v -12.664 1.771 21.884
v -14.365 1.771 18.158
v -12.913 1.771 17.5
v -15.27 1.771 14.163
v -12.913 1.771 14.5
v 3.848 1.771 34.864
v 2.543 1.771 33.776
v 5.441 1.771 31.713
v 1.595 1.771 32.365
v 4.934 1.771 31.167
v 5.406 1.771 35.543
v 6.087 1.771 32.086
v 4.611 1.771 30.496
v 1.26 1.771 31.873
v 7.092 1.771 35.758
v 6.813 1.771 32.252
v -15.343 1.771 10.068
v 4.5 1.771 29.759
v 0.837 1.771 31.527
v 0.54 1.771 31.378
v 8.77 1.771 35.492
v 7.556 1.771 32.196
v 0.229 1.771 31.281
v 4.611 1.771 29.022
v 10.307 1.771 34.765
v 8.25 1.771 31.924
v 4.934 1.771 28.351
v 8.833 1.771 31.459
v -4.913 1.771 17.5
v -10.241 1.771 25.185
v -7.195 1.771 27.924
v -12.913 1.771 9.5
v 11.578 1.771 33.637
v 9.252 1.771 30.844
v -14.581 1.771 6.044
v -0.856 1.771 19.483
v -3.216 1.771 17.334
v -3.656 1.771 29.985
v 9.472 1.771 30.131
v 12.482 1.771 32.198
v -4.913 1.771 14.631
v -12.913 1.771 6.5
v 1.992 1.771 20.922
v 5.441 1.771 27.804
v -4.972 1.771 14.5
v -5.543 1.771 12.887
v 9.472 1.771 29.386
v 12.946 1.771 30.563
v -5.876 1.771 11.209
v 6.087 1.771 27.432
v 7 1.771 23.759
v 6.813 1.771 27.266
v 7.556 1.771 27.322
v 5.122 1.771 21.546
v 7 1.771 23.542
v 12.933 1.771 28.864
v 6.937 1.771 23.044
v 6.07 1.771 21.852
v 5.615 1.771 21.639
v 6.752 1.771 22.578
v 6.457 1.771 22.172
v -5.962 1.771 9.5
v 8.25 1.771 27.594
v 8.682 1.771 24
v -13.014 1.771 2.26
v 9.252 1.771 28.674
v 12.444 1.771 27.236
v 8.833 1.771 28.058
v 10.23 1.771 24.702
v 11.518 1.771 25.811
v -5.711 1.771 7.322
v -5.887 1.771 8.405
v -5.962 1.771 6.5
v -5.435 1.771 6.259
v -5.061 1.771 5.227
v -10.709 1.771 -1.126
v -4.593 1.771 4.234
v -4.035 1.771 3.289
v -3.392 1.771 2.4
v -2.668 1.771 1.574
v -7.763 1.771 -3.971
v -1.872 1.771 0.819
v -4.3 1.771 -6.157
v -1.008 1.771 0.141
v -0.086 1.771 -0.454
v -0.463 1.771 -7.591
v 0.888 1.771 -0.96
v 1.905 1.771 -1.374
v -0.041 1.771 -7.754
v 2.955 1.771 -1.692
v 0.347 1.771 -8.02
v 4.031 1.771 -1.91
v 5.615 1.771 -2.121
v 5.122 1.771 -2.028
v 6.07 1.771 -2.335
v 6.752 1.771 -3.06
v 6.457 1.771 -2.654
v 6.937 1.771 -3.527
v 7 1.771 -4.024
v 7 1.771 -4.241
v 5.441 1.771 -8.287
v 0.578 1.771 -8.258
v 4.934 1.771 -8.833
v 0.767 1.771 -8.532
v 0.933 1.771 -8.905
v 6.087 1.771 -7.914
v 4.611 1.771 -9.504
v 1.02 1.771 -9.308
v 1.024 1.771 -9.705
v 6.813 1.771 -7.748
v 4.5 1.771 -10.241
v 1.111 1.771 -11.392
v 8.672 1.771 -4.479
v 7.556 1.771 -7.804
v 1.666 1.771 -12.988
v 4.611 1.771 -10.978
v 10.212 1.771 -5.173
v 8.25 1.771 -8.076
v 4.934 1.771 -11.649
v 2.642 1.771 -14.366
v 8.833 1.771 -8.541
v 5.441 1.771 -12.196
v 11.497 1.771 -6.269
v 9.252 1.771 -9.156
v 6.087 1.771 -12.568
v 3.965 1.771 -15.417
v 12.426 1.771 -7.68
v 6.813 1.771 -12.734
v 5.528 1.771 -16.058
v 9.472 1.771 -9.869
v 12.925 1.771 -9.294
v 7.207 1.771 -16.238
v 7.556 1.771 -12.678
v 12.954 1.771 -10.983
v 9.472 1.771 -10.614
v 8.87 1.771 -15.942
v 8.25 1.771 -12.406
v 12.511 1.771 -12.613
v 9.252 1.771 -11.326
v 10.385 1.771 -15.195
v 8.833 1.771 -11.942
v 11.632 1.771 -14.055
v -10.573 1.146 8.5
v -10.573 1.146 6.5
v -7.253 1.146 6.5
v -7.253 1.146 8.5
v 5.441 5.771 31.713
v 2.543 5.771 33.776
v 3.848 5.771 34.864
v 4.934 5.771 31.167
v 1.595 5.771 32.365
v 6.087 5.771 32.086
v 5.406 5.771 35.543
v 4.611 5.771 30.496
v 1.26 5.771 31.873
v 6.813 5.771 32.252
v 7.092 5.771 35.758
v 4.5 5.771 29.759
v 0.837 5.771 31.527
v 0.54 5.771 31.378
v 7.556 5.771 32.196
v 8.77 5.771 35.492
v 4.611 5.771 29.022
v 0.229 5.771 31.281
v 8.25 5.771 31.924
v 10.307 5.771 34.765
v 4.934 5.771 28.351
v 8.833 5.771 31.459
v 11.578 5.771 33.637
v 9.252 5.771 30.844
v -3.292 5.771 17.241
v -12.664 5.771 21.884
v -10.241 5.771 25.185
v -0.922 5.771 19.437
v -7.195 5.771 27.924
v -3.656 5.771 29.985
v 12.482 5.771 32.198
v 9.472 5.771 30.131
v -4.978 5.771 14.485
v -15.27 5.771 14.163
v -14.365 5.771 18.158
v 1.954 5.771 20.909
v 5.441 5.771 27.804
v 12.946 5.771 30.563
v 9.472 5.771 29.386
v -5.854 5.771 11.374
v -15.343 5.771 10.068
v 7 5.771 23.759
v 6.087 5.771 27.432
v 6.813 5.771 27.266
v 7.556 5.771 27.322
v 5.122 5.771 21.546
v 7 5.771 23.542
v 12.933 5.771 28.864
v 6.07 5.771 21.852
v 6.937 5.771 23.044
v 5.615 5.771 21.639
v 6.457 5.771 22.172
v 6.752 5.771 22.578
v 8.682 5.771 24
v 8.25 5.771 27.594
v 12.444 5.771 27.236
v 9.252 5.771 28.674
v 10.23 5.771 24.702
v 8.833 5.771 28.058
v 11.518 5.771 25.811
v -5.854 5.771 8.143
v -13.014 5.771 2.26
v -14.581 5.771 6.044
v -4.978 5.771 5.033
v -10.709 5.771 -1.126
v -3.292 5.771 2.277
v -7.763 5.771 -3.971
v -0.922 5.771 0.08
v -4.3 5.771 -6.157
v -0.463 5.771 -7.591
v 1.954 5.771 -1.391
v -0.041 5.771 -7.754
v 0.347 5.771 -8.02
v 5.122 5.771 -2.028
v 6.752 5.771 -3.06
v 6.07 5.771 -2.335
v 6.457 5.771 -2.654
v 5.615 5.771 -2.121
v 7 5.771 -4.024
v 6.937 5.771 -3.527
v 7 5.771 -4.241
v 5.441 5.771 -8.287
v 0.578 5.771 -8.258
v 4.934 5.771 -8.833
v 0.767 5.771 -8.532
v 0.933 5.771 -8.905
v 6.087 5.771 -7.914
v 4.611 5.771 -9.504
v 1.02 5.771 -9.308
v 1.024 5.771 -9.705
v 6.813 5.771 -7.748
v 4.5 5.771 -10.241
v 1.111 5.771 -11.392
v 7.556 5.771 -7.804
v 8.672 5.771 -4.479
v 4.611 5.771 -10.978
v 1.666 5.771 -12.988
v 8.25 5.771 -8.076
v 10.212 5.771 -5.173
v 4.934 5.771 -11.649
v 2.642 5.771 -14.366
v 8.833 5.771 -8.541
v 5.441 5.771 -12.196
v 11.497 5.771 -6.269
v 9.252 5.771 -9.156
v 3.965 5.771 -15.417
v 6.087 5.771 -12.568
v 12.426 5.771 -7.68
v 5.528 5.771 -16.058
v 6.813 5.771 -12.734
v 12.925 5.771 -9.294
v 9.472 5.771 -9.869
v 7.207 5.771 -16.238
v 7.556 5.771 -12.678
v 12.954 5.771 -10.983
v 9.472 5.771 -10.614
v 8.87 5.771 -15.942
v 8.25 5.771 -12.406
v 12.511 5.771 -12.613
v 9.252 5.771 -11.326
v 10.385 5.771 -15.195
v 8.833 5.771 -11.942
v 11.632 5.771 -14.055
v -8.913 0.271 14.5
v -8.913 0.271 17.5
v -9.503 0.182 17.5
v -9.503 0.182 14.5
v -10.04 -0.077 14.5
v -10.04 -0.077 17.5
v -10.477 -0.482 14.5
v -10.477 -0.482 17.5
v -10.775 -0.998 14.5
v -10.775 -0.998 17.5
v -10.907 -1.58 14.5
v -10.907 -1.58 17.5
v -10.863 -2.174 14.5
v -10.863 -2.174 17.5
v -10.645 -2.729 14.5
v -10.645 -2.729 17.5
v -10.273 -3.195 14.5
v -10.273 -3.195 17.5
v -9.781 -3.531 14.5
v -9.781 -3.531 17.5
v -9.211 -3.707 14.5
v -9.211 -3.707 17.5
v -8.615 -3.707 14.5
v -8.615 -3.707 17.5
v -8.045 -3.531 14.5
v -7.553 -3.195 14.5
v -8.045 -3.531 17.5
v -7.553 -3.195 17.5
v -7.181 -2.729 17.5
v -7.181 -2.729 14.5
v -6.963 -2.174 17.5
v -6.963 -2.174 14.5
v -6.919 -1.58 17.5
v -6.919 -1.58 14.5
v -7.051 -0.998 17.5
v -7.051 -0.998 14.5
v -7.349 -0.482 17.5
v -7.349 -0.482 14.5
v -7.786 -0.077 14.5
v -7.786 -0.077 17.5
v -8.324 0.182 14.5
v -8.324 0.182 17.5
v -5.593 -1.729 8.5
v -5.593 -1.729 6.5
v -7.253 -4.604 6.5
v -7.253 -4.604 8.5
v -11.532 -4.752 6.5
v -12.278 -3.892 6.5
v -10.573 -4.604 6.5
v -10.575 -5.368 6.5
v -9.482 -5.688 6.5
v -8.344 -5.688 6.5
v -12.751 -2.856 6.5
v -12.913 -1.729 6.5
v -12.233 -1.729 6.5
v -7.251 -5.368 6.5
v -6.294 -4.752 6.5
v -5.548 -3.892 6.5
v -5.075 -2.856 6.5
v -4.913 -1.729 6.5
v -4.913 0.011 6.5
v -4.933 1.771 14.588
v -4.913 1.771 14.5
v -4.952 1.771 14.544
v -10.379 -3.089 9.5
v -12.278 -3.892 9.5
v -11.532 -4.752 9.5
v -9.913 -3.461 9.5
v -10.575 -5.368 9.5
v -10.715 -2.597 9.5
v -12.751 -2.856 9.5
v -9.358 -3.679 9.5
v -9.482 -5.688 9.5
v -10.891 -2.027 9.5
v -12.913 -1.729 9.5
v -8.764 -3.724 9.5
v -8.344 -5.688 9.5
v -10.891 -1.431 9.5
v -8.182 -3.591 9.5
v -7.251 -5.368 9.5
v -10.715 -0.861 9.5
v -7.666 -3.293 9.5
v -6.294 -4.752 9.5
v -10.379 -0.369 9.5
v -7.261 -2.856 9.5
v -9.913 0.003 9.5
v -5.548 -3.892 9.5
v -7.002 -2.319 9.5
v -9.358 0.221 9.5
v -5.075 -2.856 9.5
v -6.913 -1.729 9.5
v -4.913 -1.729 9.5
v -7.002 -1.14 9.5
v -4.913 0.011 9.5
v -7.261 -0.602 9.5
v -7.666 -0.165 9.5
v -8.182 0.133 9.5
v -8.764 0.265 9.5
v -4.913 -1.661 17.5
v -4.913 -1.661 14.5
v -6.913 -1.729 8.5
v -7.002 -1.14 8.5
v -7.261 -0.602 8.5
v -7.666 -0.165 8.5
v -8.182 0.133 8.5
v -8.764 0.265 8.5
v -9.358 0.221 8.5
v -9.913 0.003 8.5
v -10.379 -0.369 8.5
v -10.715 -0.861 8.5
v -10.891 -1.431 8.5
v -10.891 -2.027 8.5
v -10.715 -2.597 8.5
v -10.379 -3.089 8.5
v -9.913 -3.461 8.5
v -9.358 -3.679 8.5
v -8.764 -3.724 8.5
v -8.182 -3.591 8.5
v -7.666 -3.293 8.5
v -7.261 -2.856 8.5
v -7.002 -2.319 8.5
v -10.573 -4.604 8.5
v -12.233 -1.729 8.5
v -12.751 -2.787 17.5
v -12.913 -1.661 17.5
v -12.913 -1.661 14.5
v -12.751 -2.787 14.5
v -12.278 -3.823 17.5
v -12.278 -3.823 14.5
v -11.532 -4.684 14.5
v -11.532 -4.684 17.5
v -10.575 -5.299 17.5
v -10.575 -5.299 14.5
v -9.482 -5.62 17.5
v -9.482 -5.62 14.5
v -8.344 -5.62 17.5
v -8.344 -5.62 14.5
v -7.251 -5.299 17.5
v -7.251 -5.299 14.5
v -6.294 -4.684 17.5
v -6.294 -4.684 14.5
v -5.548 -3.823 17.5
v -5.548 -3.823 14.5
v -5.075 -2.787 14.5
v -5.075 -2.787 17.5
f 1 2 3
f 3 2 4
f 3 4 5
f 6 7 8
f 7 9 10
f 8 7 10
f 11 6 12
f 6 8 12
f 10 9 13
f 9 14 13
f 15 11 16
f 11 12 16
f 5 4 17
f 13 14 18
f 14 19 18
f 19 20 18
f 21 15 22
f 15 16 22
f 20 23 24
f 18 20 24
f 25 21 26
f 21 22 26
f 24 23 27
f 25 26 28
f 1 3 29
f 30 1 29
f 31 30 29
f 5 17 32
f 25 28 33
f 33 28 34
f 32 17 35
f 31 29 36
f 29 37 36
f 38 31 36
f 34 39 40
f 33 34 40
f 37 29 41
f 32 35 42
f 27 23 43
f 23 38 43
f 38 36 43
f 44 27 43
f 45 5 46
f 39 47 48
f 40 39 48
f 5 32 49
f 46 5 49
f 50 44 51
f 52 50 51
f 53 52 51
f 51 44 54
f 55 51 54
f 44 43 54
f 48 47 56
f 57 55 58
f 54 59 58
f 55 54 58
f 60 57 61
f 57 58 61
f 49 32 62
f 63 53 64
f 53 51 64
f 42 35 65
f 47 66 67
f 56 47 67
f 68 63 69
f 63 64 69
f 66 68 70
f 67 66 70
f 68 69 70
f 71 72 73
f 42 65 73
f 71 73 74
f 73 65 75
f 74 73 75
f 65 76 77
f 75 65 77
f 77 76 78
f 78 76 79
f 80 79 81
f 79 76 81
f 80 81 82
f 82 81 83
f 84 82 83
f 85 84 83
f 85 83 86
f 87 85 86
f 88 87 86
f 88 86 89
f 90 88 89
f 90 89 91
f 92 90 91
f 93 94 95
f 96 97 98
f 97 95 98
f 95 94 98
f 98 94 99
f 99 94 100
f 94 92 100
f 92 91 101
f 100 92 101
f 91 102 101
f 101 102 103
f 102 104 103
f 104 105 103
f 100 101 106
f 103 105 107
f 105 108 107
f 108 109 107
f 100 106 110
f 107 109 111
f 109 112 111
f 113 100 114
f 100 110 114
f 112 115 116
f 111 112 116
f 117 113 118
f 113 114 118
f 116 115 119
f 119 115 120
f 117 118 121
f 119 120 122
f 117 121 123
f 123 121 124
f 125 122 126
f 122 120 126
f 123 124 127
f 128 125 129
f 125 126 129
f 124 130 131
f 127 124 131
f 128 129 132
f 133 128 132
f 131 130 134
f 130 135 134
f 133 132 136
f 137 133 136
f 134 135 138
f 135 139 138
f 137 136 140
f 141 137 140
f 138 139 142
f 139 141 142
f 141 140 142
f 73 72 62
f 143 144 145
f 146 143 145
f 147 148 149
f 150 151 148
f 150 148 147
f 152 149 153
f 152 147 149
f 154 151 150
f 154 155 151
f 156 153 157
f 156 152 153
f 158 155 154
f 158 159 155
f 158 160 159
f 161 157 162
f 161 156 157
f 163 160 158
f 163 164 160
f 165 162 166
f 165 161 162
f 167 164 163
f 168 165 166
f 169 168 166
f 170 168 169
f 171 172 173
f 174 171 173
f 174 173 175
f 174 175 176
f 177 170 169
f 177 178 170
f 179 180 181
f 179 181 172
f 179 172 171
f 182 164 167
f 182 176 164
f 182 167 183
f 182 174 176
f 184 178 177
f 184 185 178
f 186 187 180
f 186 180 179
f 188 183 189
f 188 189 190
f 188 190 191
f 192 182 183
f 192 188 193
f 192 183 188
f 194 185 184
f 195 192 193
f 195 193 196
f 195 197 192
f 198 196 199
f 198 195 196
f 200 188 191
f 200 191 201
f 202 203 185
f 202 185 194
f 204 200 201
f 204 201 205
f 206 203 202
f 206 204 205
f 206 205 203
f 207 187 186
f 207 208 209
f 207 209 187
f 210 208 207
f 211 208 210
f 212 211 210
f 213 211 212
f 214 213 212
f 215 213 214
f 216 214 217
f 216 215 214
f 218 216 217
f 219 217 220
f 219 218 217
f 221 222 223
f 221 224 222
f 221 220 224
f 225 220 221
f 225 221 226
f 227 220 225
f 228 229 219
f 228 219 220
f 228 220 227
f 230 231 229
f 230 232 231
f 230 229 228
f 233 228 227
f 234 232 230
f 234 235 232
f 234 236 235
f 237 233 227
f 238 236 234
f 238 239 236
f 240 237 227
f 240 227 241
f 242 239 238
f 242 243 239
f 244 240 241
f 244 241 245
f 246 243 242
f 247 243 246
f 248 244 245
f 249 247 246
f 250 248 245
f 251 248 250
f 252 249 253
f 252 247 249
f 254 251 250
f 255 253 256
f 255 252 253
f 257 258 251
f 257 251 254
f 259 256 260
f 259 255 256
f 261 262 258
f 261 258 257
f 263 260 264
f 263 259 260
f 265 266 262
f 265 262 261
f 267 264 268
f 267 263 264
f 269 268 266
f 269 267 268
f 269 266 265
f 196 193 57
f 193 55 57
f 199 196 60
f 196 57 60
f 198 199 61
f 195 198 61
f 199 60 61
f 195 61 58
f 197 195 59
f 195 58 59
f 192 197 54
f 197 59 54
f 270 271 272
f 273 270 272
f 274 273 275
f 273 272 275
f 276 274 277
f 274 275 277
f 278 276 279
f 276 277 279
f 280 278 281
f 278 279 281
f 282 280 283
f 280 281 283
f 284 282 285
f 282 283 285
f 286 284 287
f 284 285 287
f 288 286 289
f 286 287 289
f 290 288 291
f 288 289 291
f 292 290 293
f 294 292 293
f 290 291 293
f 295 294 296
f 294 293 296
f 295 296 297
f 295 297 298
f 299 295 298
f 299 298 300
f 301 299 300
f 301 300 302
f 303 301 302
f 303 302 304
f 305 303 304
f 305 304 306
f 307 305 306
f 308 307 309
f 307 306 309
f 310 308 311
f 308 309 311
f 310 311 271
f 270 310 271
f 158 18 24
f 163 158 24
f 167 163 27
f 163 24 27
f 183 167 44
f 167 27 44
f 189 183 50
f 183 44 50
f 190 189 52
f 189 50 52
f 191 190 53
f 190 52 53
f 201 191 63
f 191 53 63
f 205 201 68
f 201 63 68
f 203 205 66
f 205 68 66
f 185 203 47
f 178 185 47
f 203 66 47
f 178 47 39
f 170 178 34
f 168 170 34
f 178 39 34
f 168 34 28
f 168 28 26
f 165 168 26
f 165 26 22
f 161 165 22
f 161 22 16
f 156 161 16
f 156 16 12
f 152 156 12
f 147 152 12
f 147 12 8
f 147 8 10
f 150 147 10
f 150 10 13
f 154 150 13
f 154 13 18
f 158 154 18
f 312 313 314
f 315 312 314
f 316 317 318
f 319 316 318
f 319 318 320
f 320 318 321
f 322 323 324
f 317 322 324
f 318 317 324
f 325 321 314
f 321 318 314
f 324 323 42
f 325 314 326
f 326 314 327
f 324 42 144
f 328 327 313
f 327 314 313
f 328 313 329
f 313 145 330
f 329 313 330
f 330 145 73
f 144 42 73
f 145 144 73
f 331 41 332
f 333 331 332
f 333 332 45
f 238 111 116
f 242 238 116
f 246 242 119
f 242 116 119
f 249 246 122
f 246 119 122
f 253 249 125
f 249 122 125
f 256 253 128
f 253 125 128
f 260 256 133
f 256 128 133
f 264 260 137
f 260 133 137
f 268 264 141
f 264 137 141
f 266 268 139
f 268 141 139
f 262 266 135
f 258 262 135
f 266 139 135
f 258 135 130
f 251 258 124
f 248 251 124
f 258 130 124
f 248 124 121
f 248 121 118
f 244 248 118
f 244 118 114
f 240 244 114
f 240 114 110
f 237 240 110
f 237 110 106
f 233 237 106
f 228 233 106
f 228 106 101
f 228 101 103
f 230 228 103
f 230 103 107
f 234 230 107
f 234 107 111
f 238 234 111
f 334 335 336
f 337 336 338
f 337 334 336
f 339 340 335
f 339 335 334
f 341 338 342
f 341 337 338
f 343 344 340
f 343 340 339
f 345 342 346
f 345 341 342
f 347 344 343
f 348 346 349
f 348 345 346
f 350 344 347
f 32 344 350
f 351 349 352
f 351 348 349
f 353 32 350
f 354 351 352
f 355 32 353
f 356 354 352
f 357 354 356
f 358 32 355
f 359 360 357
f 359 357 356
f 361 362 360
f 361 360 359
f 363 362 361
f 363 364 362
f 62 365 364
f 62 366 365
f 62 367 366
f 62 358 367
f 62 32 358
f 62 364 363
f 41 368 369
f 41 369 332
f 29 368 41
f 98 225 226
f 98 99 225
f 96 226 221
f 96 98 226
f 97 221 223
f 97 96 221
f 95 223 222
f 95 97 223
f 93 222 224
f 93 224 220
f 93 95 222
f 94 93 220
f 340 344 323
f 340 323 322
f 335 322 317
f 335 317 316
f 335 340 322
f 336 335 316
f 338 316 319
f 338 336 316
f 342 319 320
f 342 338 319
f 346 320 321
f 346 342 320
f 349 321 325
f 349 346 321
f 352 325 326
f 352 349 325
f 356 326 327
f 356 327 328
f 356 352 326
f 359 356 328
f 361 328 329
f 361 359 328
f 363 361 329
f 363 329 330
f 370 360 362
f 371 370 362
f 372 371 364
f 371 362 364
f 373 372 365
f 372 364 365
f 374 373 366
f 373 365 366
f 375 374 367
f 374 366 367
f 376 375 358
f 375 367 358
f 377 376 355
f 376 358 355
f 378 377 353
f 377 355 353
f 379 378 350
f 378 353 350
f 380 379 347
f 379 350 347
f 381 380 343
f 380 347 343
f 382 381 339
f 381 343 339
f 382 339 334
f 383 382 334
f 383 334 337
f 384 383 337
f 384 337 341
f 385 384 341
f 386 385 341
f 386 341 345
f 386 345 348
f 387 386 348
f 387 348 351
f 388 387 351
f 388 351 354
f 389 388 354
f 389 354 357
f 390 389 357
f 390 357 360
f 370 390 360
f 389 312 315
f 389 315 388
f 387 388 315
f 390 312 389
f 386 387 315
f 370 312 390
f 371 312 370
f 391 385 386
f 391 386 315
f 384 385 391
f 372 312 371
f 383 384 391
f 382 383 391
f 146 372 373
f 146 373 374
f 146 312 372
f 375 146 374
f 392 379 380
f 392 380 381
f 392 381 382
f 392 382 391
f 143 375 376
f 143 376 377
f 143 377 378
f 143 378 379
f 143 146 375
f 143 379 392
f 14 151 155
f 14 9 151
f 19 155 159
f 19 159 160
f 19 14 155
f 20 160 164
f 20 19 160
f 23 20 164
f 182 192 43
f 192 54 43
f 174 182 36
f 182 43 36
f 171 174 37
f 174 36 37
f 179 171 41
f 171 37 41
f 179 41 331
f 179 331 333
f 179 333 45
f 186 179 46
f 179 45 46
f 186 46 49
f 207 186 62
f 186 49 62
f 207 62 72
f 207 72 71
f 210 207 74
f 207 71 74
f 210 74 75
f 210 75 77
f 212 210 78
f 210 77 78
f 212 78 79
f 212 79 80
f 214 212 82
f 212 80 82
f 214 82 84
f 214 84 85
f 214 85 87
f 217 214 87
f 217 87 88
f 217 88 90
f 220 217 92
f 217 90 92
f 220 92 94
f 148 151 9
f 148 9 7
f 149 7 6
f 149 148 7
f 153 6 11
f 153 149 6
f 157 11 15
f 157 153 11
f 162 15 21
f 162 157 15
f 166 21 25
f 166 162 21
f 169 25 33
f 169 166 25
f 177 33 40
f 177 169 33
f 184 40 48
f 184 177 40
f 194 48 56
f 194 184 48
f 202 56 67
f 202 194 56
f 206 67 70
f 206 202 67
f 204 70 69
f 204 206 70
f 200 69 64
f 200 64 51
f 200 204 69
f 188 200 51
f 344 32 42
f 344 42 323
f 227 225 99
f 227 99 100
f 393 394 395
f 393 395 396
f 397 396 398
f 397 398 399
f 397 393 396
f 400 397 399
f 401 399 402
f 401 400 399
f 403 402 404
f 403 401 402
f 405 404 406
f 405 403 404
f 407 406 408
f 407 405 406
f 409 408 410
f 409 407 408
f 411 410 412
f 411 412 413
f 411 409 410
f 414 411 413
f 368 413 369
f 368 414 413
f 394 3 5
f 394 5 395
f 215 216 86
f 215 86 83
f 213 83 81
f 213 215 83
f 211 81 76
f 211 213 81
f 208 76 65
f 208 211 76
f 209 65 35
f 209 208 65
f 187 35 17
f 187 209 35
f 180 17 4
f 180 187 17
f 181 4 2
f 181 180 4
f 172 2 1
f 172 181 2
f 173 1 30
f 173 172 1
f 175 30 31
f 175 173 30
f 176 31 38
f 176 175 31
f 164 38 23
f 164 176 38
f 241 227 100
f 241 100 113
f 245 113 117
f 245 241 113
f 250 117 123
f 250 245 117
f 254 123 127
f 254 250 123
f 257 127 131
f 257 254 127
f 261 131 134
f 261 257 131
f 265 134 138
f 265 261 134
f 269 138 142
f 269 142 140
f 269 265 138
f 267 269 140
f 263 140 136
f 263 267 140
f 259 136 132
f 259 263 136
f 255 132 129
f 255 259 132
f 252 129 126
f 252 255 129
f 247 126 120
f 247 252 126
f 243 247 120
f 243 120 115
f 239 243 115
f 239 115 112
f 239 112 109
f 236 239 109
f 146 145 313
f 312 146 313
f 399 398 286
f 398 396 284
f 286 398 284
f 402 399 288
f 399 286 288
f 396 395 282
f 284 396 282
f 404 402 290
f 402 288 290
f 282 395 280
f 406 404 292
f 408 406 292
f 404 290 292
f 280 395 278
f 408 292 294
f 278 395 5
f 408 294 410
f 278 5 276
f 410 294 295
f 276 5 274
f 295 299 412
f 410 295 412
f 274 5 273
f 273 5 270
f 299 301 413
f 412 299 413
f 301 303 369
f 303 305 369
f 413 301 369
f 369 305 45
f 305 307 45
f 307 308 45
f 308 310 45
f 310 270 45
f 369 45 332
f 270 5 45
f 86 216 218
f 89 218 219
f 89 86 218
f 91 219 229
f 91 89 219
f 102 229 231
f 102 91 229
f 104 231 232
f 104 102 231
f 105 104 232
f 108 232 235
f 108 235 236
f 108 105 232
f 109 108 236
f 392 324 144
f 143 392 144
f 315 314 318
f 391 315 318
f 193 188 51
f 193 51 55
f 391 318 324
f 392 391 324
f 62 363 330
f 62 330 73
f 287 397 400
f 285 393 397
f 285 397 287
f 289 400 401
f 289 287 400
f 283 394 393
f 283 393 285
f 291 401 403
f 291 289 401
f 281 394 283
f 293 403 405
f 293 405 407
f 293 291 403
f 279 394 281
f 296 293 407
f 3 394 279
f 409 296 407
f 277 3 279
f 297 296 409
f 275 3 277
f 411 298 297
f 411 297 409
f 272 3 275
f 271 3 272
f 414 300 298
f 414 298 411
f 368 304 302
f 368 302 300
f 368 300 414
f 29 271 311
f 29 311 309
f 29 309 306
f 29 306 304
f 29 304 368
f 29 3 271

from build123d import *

# Parameters (mm, degrees)
BOSS_EXTRUDE1_DEPTH          = 4
BOSS_EXTRUDE2_DEPTH          = 3
BOSS_EXTRUDE3_DEPTH          = 3
CUT_EXTRUDE1_DEPTH           = 2
F_5_0_5_DIAMETER_HOLE1_D     = 5
F_5_0_5_DIAMETER_HOLE1_DEPTH = 11.5
SKETCH7_W                    = 2
SKETCH7_H                    = 21.25889
M20_CLEARANCE_HOLE1_D        = 23.618330199
M20_CLEARANCE_HOLE1_DEPTH    = 4
F_4_0_4_DIAMETER_HOLE2_D     = 4
F_4_0_4_DIAMETER_HOLE2_DEPTH = 27.25889
FILLET1_R                    = 2


with BuildPart() as part:
    # Sketch1 → Boss-Extrude1 (new body)
    with BuildSketch(Plane(origin=(0, 5.770898059, 0), x_dir=(1, 0, 0), z_dir=(0, 1, 0))):
        with BuildLine():
            Line((7, -23.75889), (7, 4.24111))
            ThreePointArc((7, 4.24111), (10.353454391, 15.21648372), (1.438437052, 7.989662117))
            ThreePointArc((1.438437052, 7.989662117), (-15.414893863, -11.667157982), (1.252670952, -31.481739039))
            ThreePointArc((1.252670952, -31.481739039), (11.8133717, -33.340991741), (7, -23.75889))
        make_face()
    extrude(amount=-BOSS_EXTRUDE1_DEPTH)

    # Sketch2 → Boss-Extrude2 (add)
    with BuildSketch(Plane.XY.offset(17.5)):
        with BuildLine():
            Line((-4.913051605, -1.660534859), (-4.913051605, 1.770898059))
            Line((-4.913051605, 1.770898059), (-12.913051605, 1.770898059))
            Line((-12.913051605, 1.770898059), (-12.913051605, -1.660534859))
            ThreePointArc((-12.913051605, -1.660534859), (-8.913051605, -5.660534859), (-4.913051605, -1.660534859))
        make_face()
    extrude(amount=-BOSS_EXTRUDE2_DEPTH)

    # Sketch3 → Boss-Extrude3 (add)
    with BuildSketch(Plane.XY.offset(9.5)):
        with BuildLine():
            Line((-4.913051605, -1.729101941), (-4.913051605, 0.01125604))
            Line((-4.913051605, 0.01125604), (-5.962229818, 1.770898059))
            Line((-5.962229818, 1.770898059), (-12.913051605, 1.770898059))
            Line((-12.913051605, 1.770898059), (-12.913051605, -1.729101941))
            ThreePointArc((-12.913051605, -1.729101941), (-8.913051605, -5.729101941), (-4.913051605, -1.729101941))
        make_face()
    extrude(amount=-BOSS_EXTRUDE3_DEPTH)

    # Sketch4 → Cut-Extrude1 (cut)
    with BuildSketch(Plane(origin=(0, 0, 6.5), x_dir=(-1, 0, 0), z_dir=(0, 0, -1))):
        Polygon((7.253169581, 1.145898059), (5.593287557, -1.729101941), (7.253169581, -4.604101941), (10.572933629, -4.604101941), (12.232815653, -1.729101941), (10.572933629, 1.145898059), align=None)
    extrude(amount=-CUT_EXTRUDE1_DEPTH, mode=Mode.SUBTRACT)

    # Ø5.0 (5) Diameter Hole1
    with Locations(Plane(origin=(0, 5.770898059, 0), x_dir=(1, 0, 0), z_dir=(0, 1, 0))):
        with Locations((7, -29.75889), (7, 10.24111)):
            Hole(F_5_0_5_DIAMETER_HOLE1_D / 2, depth=F_5_0_5_DIAMETER_HOLE1_DEPTH)

    # Sketch7 → Ø4.0 (4) Diameter Hole1 (revolve, cut)
    with BuildSketch(Plane(origin=(-8.913051605, -1.729101941, 14.5), x_dir=(0, 1, 0), z_dir=(1, 0, 0))):
        with Locations((1, 10.629445)):
            Rectangle(SKETCH7_W, SKETCH7_H)
    revolve(axis=Axis((-8.913051605, -1.729101941, 8.15), (0, 0, 1)), mode=Mode.SUBTRACT)

    # M20 Clearance Hole1
    with Locations(Plane(origin=(0, 5.770898059, 0), x_dir=(1, 0, 0), z_dir=(0, 1, 0))):
        with Locations((5.844097137, -9.75889)):
            Hole(M20_CLEARANCE_HOLE1_D / 2, depth=M20_CLEARANCE_HOLE1_DEPTH)

    # Ø4.0 (4) Diameter Hole2
    with Locations(Plane(origin=(0, 0, 8.5), x_dir=(-1, 0, 0), z_dir=(0, 0, -1))):
        with Locations((8.913051605, -1.729101941)):
            Hole(F_4_0_4_DIAMETER_HOLE2_D / 2, depth=F_4_0_4_DIAMETER_HOLE2_DEPTH)

    # Fillet1
    fillet1_edges = [part.edges().sort_by_distance(p)[0] for p in [
        (1.438437052, 3.770898059, -7.989662117),
        (1.252670952, 3.770898059, 31.481739039),
        (7, 3.770898059, -1.993567995),
        (7, 3.770898059, 21.511347995),
    ]]
    fillet(fillet1_edges, radius=FILLET1_R)


solid = part.part
